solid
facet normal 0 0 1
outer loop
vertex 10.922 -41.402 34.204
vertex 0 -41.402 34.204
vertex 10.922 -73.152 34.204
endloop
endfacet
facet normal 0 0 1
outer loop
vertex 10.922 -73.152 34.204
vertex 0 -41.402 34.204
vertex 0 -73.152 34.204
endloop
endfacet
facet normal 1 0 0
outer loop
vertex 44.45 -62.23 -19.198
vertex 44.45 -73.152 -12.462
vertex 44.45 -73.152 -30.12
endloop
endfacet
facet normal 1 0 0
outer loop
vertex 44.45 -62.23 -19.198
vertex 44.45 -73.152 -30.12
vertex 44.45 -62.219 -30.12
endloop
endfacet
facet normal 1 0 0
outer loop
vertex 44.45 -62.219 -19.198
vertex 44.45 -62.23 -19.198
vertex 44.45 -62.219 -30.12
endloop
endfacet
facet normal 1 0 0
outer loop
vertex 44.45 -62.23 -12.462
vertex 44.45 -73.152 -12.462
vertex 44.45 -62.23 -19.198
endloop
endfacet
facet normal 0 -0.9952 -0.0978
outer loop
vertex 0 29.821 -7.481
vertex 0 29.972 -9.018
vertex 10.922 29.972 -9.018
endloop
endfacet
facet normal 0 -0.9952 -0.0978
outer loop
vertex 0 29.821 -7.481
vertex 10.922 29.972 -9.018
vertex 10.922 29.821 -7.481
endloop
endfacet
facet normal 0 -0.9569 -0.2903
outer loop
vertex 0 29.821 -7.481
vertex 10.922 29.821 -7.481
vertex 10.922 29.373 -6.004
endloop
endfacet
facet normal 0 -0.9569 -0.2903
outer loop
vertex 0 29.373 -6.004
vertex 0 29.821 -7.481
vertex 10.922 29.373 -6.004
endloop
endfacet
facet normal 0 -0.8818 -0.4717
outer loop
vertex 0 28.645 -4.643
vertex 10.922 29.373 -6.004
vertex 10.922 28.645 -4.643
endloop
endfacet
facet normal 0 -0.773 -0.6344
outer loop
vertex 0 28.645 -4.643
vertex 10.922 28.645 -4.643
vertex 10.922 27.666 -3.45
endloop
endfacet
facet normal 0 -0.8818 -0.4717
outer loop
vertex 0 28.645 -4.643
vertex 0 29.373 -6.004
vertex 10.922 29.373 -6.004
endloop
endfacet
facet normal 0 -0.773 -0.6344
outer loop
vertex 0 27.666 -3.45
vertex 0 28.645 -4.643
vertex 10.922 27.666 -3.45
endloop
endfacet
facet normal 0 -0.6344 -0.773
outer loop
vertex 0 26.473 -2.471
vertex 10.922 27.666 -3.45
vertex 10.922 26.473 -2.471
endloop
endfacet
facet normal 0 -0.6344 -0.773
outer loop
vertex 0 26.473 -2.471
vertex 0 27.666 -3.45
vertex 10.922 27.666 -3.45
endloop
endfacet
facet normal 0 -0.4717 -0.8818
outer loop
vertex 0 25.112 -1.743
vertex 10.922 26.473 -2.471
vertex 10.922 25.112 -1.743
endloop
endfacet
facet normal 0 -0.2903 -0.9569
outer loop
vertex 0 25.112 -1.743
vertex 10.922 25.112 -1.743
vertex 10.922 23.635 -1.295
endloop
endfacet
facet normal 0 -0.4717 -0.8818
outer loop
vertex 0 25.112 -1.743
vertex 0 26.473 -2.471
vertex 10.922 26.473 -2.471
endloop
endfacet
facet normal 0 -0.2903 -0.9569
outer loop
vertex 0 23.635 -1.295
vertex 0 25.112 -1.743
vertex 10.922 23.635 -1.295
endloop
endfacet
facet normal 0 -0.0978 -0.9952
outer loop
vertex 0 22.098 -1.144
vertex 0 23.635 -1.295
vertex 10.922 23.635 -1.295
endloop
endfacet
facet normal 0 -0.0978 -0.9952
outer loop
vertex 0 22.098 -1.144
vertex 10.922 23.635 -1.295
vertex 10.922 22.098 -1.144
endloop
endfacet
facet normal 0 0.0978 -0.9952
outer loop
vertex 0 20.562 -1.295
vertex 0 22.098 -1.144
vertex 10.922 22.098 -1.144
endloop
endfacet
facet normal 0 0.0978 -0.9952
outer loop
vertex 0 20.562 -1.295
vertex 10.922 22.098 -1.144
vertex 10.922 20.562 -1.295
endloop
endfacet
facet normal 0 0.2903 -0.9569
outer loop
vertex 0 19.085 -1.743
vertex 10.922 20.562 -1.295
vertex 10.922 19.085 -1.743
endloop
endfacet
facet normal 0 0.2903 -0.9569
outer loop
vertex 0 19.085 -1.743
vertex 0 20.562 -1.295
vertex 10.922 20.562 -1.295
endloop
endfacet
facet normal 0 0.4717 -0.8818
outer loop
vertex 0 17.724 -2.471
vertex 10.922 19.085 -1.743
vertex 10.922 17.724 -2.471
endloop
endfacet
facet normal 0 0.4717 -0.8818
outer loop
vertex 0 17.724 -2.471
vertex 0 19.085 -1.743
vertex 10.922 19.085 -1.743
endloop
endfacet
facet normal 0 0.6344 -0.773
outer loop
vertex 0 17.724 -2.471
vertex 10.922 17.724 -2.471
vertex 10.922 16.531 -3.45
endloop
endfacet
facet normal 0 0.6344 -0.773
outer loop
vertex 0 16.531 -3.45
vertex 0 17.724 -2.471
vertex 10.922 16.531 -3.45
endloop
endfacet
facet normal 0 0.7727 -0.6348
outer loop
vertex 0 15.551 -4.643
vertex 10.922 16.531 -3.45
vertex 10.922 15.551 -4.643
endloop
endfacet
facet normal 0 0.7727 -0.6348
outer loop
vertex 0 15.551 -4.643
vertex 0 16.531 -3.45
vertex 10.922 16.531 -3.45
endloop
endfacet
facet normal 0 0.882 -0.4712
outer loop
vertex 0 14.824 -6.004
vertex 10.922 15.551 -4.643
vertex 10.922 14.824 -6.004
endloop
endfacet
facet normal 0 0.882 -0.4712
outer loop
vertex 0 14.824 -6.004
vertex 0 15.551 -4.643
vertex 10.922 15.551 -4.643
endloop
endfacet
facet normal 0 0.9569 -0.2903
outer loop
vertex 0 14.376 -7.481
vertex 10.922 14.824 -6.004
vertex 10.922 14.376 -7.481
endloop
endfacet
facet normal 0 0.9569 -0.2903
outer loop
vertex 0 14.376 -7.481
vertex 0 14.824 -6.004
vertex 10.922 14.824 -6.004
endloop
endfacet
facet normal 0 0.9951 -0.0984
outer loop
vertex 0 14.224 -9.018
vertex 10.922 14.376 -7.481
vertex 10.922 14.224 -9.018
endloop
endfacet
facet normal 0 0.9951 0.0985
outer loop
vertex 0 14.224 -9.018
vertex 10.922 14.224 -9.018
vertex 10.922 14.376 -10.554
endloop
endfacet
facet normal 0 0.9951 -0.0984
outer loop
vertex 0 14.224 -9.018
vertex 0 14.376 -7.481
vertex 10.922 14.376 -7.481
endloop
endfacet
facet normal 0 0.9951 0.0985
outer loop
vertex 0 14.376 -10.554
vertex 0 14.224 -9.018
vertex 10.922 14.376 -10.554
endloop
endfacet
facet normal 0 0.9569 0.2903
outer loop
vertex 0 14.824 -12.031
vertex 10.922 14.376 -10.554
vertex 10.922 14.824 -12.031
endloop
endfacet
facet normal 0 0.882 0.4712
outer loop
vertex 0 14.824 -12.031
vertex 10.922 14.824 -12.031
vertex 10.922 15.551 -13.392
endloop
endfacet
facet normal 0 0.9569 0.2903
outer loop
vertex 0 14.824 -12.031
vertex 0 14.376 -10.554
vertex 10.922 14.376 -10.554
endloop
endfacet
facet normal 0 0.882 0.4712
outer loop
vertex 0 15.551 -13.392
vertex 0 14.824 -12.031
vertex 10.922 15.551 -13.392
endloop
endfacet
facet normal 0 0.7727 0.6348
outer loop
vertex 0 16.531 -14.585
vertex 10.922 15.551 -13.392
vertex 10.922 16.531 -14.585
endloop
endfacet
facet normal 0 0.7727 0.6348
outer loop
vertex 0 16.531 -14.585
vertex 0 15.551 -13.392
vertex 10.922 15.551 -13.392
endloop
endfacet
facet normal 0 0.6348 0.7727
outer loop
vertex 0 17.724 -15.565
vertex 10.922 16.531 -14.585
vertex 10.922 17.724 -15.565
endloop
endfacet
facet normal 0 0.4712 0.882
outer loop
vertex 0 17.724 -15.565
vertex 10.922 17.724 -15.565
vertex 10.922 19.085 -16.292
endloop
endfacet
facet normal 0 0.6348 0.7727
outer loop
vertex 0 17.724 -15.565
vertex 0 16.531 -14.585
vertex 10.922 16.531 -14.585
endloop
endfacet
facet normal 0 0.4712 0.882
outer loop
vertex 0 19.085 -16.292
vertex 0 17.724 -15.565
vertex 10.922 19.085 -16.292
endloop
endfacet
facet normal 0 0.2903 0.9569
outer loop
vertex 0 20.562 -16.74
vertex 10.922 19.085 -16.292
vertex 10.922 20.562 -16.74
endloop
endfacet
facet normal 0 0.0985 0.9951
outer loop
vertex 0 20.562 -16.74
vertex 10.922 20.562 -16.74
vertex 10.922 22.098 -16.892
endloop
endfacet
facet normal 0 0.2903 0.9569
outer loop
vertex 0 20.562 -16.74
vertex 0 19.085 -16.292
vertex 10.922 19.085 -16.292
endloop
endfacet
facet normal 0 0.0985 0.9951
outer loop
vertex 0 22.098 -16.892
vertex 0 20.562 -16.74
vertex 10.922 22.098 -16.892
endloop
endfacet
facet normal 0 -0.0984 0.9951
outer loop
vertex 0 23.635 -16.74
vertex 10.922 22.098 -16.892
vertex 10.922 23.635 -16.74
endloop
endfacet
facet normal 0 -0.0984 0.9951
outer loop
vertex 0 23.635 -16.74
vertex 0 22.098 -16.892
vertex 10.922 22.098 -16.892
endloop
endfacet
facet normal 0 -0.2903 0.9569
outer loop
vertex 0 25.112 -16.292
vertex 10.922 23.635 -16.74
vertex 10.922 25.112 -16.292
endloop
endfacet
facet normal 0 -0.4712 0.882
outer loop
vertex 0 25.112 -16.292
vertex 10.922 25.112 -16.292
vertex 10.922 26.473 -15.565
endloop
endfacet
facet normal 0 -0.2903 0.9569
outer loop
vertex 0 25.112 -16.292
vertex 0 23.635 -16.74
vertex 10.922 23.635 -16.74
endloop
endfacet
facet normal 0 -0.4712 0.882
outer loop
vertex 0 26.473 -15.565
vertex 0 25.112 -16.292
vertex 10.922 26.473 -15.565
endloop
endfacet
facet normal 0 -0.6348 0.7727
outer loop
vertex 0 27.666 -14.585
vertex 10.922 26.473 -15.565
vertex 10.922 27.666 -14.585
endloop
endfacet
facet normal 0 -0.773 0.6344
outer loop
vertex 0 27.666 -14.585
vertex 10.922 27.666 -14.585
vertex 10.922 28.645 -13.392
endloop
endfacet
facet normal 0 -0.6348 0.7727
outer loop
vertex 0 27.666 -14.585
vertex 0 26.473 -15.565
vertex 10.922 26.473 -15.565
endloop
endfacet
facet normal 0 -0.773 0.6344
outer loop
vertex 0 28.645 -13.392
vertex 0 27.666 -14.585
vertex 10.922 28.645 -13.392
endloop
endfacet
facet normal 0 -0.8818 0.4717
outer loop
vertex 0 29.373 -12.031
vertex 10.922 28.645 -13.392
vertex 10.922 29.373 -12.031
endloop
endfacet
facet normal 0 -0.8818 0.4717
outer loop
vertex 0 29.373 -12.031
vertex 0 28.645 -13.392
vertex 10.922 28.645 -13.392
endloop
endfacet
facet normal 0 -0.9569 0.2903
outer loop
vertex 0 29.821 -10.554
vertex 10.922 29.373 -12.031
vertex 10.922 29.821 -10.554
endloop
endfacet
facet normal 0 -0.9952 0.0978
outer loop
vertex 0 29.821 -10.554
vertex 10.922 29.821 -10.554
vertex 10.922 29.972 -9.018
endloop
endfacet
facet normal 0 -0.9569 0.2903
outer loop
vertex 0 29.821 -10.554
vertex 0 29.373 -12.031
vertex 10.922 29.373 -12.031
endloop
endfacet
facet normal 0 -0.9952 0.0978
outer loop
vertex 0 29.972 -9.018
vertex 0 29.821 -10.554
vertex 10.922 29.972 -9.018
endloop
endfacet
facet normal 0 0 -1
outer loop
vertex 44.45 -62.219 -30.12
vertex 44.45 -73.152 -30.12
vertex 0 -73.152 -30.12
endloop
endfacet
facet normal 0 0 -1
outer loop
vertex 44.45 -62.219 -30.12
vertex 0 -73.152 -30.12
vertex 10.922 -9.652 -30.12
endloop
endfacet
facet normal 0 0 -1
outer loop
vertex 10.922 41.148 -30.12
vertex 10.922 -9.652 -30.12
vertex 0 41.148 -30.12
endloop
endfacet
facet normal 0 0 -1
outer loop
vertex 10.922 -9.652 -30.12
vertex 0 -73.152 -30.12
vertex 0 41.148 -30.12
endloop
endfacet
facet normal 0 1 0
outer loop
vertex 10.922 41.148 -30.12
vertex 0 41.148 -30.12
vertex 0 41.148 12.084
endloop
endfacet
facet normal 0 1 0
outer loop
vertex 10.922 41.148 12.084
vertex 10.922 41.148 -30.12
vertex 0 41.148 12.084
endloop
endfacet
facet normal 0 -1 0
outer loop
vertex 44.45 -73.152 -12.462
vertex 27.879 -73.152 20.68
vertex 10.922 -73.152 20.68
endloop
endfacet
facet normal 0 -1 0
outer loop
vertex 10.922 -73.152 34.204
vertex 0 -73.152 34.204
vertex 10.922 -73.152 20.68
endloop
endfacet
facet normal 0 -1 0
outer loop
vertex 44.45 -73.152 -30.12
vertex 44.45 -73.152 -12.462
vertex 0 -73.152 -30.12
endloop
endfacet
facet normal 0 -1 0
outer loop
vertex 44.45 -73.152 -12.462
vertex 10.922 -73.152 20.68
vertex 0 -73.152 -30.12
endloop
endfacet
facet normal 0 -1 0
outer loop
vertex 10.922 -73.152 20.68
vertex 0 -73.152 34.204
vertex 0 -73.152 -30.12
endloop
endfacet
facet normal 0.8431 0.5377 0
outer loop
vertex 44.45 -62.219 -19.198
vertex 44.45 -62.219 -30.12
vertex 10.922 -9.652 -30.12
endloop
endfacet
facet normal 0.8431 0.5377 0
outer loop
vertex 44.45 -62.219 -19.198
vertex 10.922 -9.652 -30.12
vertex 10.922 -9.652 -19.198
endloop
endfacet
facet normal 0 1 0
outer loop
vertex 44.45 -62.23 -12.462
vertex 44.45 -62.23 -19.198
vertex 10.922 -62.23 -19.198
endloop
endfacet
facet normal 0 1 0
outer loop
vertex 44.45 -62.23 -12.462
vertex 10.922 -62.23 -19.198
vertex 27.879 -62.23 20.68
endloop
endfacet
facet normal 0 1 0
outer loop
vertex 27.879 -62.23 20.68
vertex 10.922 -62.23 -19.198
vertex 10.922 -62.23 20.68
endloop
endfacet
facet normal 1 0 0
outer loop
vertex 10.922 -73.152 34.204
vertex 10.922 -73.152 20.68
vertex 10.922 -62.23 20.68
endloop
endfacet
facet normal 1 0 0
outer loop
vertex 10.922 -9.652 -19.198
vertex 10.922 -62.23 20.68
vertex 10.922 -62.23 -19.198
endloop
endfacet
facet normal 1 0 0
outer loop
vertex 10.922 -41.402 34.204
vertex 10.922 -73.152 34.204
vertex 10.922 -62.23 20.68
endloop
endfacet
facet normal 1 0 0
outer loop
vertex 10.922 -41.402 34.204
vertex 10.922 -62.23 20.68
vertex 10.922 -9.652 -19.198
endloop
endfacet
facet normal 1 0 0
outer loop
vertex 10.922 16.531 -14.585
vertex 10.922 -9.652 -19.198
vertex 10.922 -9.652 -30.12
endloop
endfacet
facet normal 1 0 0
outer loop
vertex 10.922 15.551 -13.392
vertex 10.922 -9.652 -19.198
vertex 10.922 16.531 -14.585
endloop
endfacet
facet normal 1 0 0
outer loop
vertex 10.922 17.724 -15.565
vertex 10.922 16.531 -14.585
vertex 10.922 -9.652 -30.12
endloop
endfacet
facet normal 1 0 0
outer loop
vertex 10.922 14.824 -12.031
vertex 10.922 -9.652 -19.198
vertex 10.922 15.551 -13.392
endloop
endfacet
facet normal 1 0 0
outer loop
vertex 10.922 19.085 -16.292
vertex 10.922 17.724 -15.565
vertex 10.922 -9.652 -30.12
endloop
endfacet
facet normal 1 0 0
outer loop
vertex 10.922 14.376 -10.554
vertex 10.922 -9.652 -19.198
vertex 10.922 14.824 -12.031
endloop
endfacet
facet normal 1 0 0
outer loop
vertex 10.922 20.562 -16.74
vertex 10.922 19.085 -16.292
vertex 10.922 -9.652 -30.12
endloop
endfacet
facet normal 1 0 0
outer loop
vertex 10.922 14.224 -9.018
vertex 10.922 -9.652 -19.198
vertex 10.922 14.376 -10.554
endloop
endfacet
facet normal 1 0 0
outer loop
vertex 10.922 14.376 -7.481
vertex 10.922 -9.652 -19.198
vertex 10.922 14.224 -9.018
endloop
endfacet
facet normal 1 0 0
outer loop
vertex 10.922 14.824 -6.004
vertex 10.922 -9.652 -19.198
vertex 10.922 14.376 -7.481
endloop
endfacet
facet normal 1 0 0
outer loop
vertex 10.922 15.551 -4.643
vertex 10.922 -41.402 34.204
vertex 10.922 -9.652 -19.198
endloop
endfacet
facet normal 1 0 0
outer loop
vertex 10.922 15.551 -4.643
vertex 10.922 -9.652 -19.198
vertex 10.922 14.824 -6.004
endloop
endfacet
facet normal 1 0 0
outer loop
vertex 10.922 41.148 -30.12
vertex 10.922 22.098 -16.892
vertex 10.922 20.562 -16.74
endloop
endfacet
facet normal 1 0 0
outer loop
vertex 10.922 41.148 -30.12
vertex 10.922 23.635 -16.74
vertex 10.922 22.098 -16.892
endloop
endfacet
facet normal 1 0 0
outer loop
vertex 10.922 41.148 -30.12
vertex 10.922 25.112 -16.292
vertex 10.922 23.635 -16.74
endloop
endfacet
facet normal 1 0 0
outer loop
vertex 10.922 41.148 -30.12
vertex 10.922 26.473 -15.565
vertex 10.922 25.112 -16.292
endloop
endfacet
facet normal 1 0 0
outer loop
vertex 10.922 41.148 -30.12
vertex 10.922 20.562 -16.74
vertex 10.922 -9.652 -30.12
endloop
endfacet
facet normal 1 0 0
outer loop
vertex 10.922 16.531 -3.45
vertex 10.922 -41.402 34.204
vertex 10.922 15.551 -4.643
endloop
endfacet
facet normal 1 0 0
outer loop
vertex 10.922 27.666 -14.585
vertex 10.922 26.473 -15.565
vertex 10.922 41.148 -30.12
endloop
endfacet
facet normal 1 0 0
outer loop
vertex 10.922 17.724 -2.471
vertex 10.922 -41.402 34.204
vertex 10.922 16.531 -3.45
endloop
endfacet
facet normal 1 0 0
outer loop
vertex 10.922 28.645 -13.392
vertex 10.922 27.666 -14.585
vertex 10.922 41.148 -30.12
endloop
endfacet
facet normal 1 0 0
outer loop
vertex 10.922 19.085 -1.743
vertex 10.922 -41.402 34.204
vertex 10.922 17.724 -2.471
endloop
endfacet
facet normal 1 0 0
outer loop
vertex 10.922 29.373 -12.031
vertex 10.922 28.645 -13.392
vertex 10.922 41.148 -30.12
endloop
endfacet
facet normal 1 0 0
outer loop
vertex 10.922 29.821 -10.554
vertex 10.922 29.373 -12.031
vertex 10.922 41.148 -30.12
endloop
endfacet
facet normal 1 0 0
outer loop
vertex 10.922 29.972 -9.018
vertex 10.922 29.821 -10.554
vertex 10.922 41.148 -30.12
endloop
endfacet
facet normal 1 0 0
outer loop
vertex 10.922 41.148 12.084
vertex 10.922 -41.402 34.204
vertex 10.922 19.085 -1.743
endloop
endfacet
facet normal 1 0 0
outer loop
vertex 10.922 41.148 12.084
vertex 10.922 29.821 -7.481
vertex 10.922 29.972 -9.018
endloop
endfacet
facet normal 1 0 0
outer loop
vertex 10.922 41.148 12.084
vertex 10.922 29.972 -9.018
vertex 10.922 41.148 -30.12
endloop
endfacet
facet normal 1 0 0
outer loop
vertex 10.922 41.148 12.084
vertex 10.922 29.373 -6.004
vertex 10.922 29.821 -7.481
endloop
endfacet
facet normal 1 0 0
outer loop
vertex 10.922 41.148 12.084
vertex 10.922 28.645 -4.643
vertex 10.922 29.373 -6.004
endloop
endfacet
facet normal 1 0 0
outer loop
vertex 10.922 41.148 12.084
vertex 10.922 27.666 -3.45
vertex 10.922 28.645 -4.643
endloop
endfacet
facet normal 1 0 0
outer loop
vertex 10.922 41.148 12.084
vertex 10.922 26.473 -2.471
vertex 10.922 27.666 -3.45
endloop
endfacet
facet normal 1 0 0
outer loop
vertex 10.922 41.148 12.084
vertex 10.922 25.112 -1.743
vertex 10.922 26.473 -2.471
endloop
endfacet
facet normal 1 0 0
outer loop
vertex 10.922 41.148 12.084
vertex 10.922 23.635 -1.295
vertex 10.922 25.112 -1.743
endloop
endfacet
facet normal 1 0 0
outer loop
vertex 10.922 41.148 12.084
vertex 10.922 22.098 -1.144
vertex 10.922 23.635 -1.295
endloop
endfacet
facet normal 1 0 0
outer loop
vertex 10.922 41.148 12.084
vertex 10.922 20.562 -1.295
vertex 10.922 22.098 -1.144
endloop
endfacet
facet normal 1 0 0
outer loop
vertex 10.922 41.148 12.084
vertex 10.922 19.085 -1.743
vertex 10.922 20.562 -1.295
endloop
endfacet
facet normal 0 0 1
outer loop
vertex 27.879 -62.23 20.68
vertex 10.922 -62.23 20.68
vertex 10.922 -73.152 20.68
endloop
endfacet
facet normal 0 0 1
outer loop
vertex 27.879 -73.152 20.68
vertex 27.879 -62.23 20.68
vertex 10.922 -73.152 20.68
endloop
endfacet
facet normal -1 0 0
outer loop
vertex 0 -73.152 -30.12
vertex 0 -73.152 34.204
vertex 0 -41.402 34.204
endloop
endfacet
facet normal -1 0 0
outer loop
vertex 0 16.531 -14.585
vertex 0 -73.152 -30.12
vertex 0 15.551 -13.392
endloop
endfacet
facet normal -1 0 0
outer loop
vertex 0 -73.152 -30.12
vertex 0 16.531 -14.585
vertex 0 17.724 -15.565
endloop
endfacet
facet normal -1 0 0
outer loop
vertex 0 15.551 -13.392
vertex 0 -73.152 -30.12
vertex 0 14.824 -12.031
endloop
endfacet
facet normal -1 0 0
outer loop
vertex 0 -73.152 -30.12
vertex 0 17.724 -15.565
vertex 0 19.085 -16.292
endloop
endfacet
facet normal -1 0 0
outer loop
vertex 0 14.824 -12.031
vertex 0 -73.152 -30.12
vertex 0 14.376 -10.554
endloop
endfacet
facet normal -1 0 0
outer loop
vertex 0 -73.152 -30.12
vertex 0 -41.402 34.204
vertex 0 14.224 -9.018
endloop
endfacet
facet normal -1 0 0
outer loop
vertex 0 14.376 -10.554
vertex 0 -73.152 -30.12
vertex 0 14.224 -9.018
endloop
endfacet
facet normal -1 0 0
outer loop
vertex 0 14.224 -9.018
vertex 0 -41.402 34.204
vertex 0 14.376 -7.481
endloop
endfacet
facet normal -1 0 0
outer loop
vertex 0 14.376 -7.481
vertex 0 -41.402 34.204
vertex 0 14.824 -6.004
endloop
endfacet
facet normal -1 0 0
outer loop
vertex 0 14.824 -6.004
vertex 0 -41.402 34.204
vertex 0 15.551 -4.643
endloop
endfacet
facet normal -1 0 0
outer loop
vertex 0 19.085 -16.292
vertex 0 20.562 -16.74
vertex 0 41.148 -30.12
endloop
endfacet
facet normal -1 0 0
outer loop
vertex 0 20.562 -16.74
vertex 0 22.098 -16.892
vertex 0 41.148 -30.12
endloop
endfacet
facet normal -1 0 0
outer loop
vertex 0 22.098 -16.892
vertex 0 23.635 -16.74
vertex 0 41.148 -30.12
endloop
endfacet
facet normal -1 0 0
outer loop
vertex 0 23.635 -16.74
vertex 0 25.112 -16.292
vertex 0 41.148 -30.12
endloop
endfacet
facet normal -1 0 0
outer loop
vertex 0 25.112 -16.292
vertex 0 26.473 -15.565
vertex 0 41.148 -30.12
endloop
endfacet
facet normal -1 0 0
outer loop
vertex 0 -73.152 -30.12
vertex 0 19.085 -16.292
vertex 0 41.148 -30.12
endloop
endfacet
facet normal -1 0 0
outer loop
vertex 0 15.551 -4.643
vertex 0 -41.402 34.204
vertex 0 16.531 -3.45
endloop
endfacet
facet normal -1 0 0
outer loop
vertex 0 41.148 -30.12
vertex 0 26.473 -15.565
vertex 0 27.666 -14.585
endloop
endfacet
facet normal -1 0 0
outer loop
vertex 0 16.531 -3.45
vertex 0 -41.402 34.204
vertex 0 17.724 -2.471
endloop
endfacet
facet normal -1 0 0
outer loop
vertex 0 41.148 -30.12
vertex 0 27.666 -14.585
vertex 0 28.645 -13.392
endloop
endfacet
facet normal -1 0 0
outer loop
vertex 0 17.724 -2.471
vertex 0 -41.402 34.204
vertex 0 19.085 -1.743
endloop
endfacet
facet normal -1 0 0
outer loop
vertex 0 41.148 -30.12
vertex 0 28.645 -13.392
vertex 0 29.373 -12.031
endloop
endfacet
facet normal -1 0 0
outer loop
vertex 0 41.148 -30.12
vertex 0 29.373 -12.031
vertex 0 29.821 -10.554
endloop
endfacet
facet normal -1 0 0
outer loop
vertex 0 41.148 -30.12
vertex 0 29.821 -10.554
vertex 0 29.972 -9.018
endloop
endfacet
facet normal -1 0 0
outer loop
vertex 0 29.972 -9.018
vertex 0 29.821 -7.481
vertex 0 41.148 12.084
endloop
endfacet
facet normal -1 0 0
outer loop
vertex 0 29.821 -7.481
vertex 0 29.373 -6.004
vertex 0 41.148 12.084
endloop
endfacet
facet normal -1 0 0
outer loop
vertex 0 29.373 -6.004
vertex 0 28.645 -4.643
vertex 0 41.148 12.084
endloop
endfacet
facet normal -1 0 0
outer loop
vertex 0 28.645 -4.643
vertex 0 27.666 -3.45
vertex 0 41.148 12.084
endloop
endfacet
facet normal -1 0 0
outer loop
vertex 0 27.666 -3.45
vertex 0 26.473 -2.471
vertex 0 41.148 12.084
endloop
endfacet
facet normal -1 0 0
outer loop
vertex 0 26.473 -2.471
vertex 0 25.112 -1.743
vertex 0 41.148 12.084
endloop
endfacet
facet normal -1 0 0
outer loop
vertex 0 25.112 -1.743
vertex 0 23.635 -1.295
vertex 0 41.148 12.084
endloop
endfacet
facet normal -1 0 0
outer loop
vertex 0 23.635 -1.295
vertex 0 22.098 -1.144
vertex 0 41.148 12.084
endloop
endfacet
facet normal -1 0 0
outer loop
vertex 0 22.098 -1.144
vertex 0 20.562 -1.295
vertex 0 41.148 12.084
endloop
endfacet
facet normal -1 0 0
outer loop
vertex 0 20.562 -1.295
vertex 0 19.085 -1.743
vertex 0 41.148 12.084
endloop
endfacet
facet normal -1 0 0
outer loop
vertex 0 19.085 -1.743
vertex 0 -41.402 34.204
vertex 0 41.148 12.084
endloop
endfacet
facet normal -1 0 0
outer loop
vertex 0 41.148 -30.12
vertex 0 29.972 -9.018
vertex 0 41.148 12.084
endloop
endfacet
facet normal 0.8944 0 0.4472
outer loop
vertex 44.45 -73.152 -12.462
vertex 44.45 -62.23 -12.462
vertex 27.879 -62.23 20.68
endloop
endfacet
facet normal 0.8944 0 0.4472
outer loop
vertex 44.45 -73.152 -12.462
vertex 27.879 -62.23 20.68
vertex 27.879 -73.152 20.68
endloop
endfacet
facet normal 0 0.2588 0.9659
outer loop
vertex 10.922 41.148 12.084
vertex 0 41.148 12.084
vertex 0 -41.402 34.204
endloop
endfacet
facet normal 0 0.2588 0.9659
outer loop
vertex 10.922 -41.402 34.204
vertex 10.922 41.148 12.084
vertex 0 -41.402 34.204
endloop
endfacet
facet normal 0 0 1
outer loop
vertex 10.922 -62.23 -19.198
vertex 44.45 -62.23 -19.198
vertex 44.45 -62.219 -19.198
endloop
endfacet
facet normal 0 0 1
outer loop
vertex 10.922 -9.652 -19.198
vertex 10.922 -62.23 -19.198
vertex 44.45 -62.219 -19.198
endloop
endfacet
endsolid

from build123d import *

# Parameters (mm, degrees)
F0_R     = 7.874
F1_DEPTH = 10.922
F0_W     = 52.578
F0_H     = 10.922
F2_DEPTH = 44.45
F3_SIZE2 = 33.1422148526
F3_SIZE  = 16.5711074262
F4_SIZE2 = 52.567648
F4_SIZE  = 33.52799


# Not quite as in the source:
# - a fillet or chamfer is up to 0.001 mm smaller than in the source, because OpenCascade refuses the exact size


with BuildPart() as f1:
    # F0 (on Right) → F1 (new body)
    with BuildSketch(Plane.YZ):
        Polygon((-41.4015134737, 34.2036390094), (-73.1515134737, 34.2036390094), (-73.1515134737, 20.6804594447), (-62.2295134737, 20.6804594447), (-62.2295134737, -19.1975405553), (-9.6515134737, -19.1975405553), (-9.6515134737, -30.1195405553), (41.1484865263, -30.1195405553), (41.1484865263, 12.0844331742), align=None)
        with Locations((22.0984865263, -9.0175536905)):
            Circle(F0_R, mode=Mode.SUBTRACT)
    extrude(amount=F1_DEPTH)

    # F0 (on Right) → F2 (join)
    with BuildSketch(Plane.YZ):
        with Locations((-35.9405134737, -24.6585405553)):
            Rectangle(F0_W, F0_H)
        Polygon((-62.2295134737, 20.6804594447), (-73.1515134737, 20.6804594447), (-73.1515134737, -30.1195405553), (-62.2295134737, -30.1195405553), (-62.2295134737, -19.1975405553), align=None)
    extrude(amount=F2_DEPTH)

    # F3
    f3_edges = [f1.edges().sort_by_distance(p)[0] for p in [
        (44.45, -67.690513, 20.680459),
    ]]
    f3_side = f1.faces().sort_by_distance((27.686, -67.690513, 20.680459))[0]
    chamfer(f3_edges, length=F3_SIZE, length2=F3_SIZE2, reference=f3_side)

    # F4 (size 33.528 and 52.5676582111 in the source; OpenCascade refuses exactly that, so slightly less here)
    f4_edges = [f1.edges().sort_by_distance(p)[0] for p in [
        (44.45, -9.651513, -24.658541),
    ]]
    f4_side = f1.faces().sort_by_distance((27.686, -9.651513, -24.658541))[0]
    chamfer(f4_edges, length=F4_SIZE, length2=F4_SIZE2, reference=f4_side)


solid = f1.part
